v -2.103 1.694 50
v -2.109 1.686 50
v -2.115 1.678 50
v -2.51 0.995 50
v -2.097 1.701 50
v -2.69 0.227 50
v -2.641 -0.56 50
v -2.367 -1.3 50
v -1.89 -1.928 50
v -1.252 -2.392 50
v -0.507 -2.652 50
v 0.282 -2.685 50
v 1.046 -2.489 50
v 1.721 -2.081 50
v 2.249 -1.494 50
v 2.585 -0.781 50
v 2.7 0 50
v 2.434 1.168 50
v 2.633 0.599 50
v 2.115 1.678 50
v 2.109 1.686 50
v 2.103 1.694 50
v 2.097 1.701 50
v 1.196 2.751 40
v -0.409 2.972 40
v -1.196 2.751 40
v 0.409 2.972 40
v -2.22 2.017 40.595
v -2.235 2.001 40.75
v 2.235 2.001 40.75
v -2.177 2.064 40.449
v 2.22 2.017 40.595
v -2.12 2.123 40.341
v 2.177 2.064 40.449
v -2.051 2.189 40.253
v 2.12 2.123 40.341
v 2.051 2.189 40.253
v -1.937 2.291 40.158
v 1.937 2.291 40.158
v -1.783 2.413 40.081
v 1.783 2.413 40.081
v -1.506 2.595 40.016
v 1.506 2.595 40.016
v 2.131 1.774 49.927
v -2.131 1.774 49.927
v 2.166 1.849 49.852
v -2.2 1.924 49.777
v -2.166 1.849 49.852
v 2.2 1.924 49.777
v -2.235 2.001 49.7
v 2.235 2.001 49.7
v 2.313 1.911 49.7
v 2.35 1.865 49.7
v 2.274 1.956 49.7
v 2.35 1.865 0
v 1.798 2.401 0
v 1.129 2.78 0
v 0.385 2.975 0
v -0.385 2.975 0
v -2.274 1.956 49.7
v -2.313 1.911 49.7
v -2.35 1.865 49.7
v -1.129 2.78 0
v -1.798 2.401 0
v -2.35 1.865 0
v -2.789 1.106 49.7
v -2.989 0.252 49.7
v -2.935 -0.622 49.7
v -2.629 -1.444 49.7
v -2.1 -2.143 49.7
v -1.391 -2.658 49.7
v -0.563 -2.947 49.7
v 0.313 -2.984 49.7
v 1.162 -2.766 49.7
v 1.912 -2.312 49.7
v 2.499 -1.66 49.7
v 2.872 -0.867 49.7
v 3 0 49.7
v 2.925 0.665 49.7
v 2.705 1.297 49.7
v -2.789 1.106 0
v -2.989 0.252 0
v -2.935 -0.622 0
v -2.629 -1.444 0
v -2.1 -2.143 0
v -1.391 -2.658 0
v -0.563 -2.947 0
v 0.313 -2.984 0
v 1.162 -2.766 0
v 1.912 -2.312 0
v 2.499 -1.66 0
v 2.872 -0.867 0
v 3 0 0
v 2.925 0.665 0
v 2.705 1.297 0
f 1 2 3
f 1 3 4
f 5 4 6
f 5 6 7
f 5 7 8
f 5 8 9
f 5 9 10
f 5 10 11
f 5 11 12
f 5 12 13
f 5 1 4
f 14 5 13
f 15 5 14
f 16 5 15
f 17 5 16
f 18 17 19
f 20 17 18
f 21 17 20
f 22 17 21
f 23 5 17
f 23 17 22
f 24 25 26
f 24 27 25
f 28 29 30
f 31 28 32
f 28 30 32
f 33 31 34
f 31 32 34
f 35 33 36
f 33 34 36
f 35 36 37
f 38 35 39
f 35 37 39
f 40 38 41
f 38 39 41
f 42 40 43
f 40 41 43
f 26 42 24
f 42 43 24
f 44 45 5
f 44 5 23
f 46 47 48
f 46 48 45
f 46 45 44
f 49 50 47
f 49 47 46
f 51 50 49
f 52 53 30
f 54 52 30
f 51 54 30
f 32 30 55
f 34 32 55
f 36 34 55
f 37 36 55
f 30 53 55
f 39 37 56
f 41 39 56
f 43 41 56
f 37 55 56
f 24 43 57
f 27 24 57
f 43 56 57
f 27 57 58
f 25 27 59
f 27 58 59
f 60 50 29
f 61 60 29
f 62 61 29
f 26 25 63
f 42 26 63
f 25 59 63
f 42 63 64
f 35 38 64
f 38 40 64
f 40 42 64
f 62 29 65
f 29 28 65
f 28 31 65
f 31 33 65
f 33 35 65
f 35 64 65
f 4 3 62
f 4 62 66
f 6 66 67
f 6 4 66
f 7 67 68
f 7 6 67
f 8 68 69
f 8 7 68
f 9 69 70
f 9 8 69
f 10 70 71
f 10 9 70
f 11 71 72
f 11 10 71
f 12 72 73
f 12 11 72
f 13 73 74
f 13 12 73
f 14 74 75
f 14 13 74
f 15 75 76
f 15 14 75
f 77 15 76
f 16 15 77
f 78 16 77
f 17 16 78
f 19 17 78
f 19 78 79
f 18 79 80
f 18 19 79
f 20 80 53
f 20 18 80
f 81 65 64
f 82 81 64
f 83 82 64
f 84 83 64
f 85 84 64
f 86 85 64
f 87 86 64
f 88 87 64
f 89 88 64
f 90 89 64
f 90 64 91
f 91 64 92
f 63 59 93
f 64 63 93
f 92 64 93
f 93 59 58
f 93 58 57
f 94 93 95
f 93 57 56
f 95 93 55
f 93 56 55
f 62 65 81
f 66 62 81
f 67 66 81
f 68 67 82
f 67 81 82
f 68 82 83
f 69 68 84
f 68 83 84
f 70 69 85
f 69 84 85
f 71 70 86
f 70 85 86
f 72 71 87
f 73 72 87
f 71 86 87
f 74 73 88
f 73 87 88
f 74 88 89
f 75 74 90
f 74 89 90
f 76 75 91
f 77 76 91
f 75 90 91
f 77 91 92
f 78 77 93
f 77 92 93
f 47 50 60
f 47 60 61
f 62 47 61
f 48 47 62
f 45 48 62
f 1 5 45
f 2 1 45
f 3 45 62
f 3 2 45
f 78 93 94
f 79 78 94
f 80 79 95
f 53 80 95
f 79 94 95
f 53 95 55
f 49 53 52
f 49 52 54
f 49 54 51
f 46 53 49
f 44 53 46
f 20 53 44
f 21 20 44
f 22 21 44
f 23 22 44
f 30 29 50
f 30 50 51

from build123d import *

# Parameters (mm, degrees)
BOSS_EXTRUDE1_DEPTH = 50
SKETCH2_W           = 4.47
SKETCH2_H           = 5
CUT_EXTRUDE2_DEPTH  = 10
CHAMFER1_SIZE       = 0.3
FILLET1_R           = 0.75


with BuildPart() as part:
    # Sketch1 → Boss-Extrude1 (new body)
    with BuildSketch(Plane.XY):
        with BuildLine():
            ThreePointArc((2.35, 1.86480562), (0, 3), (-2.35, 1.86480562))
            Line((-2.35, 1.86480562), (2.35, 1.86480562))
        make_face()
        with BuildLine():
            Line((2.35, 1.86480562), (-2.35, 1.86480562))
            ThreePointArc((-2.35, 1.86480562), (-0.987420883, -2.832843095), (3, 0))
            ThreePointArc((3, 0), (2.832843095, 0.987420883), (2.35, 1.86480562))
        make_face()
    extrude(amount=BOSS_EXTRUDE1_DEPTH)

    # Sketch2 → Cut-Extrude2 (cut)
    with BuildSketch(Plane.XY.offset(50)):
        with Locations((0, 4.501193394)):
            Rectangle(SKETCH2_W, SKETCH2_H)
    extrude(amount=-CUT_EXTRUDE2_DEPTH, mode=Mode.SUBTRACT)

    # Chamfer1
    chamfer1_edges = [part.edges().sort_by_distance(p)[0] for p in [
        (-0.089200091, -2.998673597, 50),
        (0, 2.001193394, 50),
    ]]
    chamfer(chamfer1_edges, length=CHAMFER1_SIZE)

    # Fillet1
    fillet1_edges = [part.edges().sort_by_distance(p)[0] for p in [
        (0, 2.001193394, 40),
    ]]
    fillet(fillet1_edges, radius=FILLET1_R)


solid = part.part
